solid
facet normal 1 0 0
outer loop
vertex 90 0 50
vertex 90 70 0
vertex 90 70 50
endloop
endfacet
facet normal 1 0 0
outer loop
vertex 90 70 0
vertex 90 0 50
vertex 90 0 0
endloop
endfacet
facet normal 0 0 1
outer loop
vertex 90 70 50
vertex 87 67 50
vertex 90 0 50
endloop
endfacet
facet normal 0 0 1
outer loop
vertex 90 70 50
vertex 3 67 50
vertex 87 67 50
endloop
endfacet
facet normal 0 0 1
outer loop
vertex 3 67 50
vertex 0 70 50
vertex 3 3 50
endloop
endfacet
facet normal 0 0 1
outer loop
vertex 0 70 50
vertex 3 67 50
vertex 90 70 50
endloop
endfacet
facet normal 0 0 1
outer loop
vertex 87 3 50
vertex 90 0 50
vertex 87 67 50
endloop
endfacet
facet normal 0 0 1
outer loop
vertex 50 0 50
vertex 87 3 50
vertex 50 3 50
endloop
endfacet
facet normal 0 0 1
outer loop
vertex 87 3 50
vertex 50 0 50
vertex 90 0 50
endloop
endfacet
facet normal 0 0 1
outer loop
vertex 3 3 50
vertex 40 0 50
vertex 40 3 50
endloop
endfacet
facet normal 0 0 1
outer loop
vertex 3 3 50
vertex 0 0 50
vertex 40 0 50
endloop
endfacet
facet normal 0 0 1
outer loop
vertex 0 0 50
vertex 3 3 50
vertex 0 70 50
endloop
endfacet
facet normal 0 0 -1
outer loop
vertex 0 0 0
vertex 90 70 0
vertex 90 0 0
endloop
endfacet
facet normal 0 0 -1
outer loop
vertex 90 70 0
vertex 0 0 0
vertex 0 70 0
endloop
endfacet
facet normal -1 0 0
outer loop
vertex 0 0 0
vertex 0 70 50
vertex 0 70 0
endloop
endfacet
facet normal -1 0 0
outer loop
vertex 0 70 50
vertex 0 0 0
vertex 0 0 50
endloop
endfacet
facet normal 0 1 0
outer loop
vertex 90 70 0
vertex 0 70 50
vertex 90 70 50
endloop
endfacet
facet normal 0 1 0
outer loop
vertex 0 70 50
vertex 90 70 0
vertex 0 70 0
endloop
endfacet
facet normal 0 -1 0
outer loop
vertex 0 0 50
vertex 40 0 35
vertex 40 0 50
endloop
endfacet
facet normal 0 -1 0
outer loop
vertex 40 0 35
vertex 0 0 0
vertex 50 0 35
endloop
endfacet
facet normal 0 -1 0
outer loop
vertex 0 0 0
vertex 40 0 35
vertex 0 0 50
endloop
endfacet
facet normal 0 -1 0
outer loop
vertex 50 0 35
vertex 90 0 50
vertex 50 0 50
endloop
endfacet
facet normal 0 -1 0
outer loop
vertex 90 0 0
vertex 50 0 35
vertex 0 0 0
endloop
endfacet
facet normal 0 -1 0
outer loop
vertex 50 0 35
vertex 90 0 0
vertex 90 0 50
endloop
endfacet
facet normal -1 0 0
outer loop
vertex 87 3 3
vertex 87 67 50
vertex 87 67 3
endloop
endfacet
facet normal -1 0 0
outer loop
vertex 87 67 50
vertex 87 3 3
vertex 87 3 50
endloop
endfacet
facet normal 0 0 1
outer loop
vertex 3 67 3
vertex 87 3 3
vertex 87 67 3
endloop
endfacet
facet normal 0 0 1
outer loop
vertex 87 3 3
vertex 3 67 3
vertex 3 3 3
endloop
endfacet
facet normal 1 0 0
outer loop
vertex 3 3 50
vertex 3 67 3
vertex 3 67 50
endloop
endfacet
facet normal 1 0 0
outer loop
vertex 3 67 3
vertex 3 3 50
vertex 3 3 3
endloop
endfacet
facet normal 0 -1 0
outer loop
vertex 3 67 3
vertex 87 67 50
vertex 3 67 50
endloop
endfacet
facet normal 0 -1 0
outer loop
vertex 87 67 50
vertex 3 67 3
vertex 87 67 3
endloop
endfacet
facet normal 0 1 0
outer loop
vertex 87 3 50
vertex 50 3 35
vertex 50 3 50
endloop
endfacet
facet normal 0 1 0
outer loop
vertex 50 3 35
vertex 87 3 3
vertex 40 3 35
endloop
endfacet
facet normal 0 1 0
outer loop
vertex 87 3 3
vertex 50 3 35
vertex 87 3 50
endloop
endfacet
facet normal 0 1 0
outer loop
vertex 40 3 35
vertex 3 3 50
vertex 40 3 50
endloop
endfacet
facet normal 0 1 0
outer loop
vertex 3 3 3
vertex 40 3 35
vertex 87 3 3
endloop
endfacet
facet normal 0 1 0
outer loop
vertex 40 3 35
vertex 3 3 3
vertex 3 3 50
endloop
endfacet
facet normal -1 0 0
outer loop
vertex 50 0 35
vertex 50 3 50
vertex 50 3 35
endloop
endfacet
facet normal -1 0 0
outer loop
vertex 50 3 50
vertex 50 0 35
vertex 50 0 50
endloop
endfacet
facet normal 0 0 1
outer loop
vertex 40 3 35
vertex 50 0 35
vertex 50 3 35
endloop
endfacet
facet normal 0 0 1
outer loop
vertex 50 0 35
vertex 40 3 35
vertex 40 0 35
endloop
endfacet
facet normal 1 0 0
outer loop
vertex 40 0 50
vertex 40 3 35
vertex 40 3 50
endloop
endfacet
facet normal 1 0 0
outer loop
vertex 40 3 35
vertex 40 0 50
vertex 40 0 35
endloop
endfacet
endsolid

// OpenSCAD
$fn = 32;

// ----------------------------------------------------------------------
// Enclosure box: notch enclosure
// ----------------------------------------------------------------------

// --- parameters (mm) ---
box_l = 90;               // outer length, X
box_w = 70;               // outer width, Y
box_h = 50;               // outer height
wall_t = 3;               // wall thickness
notch_w = 10;             // cable notch width
notch_h = 15;             // cable notch height

inner_h = box_h - wall_t;  // cavity depth
boss_h = inner_h - 2;  // corner boss height

difference() {
  union() {
    difference() {
      cube([box_l, box_w, box_h]);
      translate([wall_t, wall_t, wall_t])
        cube([box_l - 2 * wall_t, box_w - 2 * wall_t, box_h]);
    }
  }
  translate([box_l / 2 - notch_w / 2, -1, box_h - notch_h])
    cube([notch_w, wall_t + 2, notch_h + 1]);
}
